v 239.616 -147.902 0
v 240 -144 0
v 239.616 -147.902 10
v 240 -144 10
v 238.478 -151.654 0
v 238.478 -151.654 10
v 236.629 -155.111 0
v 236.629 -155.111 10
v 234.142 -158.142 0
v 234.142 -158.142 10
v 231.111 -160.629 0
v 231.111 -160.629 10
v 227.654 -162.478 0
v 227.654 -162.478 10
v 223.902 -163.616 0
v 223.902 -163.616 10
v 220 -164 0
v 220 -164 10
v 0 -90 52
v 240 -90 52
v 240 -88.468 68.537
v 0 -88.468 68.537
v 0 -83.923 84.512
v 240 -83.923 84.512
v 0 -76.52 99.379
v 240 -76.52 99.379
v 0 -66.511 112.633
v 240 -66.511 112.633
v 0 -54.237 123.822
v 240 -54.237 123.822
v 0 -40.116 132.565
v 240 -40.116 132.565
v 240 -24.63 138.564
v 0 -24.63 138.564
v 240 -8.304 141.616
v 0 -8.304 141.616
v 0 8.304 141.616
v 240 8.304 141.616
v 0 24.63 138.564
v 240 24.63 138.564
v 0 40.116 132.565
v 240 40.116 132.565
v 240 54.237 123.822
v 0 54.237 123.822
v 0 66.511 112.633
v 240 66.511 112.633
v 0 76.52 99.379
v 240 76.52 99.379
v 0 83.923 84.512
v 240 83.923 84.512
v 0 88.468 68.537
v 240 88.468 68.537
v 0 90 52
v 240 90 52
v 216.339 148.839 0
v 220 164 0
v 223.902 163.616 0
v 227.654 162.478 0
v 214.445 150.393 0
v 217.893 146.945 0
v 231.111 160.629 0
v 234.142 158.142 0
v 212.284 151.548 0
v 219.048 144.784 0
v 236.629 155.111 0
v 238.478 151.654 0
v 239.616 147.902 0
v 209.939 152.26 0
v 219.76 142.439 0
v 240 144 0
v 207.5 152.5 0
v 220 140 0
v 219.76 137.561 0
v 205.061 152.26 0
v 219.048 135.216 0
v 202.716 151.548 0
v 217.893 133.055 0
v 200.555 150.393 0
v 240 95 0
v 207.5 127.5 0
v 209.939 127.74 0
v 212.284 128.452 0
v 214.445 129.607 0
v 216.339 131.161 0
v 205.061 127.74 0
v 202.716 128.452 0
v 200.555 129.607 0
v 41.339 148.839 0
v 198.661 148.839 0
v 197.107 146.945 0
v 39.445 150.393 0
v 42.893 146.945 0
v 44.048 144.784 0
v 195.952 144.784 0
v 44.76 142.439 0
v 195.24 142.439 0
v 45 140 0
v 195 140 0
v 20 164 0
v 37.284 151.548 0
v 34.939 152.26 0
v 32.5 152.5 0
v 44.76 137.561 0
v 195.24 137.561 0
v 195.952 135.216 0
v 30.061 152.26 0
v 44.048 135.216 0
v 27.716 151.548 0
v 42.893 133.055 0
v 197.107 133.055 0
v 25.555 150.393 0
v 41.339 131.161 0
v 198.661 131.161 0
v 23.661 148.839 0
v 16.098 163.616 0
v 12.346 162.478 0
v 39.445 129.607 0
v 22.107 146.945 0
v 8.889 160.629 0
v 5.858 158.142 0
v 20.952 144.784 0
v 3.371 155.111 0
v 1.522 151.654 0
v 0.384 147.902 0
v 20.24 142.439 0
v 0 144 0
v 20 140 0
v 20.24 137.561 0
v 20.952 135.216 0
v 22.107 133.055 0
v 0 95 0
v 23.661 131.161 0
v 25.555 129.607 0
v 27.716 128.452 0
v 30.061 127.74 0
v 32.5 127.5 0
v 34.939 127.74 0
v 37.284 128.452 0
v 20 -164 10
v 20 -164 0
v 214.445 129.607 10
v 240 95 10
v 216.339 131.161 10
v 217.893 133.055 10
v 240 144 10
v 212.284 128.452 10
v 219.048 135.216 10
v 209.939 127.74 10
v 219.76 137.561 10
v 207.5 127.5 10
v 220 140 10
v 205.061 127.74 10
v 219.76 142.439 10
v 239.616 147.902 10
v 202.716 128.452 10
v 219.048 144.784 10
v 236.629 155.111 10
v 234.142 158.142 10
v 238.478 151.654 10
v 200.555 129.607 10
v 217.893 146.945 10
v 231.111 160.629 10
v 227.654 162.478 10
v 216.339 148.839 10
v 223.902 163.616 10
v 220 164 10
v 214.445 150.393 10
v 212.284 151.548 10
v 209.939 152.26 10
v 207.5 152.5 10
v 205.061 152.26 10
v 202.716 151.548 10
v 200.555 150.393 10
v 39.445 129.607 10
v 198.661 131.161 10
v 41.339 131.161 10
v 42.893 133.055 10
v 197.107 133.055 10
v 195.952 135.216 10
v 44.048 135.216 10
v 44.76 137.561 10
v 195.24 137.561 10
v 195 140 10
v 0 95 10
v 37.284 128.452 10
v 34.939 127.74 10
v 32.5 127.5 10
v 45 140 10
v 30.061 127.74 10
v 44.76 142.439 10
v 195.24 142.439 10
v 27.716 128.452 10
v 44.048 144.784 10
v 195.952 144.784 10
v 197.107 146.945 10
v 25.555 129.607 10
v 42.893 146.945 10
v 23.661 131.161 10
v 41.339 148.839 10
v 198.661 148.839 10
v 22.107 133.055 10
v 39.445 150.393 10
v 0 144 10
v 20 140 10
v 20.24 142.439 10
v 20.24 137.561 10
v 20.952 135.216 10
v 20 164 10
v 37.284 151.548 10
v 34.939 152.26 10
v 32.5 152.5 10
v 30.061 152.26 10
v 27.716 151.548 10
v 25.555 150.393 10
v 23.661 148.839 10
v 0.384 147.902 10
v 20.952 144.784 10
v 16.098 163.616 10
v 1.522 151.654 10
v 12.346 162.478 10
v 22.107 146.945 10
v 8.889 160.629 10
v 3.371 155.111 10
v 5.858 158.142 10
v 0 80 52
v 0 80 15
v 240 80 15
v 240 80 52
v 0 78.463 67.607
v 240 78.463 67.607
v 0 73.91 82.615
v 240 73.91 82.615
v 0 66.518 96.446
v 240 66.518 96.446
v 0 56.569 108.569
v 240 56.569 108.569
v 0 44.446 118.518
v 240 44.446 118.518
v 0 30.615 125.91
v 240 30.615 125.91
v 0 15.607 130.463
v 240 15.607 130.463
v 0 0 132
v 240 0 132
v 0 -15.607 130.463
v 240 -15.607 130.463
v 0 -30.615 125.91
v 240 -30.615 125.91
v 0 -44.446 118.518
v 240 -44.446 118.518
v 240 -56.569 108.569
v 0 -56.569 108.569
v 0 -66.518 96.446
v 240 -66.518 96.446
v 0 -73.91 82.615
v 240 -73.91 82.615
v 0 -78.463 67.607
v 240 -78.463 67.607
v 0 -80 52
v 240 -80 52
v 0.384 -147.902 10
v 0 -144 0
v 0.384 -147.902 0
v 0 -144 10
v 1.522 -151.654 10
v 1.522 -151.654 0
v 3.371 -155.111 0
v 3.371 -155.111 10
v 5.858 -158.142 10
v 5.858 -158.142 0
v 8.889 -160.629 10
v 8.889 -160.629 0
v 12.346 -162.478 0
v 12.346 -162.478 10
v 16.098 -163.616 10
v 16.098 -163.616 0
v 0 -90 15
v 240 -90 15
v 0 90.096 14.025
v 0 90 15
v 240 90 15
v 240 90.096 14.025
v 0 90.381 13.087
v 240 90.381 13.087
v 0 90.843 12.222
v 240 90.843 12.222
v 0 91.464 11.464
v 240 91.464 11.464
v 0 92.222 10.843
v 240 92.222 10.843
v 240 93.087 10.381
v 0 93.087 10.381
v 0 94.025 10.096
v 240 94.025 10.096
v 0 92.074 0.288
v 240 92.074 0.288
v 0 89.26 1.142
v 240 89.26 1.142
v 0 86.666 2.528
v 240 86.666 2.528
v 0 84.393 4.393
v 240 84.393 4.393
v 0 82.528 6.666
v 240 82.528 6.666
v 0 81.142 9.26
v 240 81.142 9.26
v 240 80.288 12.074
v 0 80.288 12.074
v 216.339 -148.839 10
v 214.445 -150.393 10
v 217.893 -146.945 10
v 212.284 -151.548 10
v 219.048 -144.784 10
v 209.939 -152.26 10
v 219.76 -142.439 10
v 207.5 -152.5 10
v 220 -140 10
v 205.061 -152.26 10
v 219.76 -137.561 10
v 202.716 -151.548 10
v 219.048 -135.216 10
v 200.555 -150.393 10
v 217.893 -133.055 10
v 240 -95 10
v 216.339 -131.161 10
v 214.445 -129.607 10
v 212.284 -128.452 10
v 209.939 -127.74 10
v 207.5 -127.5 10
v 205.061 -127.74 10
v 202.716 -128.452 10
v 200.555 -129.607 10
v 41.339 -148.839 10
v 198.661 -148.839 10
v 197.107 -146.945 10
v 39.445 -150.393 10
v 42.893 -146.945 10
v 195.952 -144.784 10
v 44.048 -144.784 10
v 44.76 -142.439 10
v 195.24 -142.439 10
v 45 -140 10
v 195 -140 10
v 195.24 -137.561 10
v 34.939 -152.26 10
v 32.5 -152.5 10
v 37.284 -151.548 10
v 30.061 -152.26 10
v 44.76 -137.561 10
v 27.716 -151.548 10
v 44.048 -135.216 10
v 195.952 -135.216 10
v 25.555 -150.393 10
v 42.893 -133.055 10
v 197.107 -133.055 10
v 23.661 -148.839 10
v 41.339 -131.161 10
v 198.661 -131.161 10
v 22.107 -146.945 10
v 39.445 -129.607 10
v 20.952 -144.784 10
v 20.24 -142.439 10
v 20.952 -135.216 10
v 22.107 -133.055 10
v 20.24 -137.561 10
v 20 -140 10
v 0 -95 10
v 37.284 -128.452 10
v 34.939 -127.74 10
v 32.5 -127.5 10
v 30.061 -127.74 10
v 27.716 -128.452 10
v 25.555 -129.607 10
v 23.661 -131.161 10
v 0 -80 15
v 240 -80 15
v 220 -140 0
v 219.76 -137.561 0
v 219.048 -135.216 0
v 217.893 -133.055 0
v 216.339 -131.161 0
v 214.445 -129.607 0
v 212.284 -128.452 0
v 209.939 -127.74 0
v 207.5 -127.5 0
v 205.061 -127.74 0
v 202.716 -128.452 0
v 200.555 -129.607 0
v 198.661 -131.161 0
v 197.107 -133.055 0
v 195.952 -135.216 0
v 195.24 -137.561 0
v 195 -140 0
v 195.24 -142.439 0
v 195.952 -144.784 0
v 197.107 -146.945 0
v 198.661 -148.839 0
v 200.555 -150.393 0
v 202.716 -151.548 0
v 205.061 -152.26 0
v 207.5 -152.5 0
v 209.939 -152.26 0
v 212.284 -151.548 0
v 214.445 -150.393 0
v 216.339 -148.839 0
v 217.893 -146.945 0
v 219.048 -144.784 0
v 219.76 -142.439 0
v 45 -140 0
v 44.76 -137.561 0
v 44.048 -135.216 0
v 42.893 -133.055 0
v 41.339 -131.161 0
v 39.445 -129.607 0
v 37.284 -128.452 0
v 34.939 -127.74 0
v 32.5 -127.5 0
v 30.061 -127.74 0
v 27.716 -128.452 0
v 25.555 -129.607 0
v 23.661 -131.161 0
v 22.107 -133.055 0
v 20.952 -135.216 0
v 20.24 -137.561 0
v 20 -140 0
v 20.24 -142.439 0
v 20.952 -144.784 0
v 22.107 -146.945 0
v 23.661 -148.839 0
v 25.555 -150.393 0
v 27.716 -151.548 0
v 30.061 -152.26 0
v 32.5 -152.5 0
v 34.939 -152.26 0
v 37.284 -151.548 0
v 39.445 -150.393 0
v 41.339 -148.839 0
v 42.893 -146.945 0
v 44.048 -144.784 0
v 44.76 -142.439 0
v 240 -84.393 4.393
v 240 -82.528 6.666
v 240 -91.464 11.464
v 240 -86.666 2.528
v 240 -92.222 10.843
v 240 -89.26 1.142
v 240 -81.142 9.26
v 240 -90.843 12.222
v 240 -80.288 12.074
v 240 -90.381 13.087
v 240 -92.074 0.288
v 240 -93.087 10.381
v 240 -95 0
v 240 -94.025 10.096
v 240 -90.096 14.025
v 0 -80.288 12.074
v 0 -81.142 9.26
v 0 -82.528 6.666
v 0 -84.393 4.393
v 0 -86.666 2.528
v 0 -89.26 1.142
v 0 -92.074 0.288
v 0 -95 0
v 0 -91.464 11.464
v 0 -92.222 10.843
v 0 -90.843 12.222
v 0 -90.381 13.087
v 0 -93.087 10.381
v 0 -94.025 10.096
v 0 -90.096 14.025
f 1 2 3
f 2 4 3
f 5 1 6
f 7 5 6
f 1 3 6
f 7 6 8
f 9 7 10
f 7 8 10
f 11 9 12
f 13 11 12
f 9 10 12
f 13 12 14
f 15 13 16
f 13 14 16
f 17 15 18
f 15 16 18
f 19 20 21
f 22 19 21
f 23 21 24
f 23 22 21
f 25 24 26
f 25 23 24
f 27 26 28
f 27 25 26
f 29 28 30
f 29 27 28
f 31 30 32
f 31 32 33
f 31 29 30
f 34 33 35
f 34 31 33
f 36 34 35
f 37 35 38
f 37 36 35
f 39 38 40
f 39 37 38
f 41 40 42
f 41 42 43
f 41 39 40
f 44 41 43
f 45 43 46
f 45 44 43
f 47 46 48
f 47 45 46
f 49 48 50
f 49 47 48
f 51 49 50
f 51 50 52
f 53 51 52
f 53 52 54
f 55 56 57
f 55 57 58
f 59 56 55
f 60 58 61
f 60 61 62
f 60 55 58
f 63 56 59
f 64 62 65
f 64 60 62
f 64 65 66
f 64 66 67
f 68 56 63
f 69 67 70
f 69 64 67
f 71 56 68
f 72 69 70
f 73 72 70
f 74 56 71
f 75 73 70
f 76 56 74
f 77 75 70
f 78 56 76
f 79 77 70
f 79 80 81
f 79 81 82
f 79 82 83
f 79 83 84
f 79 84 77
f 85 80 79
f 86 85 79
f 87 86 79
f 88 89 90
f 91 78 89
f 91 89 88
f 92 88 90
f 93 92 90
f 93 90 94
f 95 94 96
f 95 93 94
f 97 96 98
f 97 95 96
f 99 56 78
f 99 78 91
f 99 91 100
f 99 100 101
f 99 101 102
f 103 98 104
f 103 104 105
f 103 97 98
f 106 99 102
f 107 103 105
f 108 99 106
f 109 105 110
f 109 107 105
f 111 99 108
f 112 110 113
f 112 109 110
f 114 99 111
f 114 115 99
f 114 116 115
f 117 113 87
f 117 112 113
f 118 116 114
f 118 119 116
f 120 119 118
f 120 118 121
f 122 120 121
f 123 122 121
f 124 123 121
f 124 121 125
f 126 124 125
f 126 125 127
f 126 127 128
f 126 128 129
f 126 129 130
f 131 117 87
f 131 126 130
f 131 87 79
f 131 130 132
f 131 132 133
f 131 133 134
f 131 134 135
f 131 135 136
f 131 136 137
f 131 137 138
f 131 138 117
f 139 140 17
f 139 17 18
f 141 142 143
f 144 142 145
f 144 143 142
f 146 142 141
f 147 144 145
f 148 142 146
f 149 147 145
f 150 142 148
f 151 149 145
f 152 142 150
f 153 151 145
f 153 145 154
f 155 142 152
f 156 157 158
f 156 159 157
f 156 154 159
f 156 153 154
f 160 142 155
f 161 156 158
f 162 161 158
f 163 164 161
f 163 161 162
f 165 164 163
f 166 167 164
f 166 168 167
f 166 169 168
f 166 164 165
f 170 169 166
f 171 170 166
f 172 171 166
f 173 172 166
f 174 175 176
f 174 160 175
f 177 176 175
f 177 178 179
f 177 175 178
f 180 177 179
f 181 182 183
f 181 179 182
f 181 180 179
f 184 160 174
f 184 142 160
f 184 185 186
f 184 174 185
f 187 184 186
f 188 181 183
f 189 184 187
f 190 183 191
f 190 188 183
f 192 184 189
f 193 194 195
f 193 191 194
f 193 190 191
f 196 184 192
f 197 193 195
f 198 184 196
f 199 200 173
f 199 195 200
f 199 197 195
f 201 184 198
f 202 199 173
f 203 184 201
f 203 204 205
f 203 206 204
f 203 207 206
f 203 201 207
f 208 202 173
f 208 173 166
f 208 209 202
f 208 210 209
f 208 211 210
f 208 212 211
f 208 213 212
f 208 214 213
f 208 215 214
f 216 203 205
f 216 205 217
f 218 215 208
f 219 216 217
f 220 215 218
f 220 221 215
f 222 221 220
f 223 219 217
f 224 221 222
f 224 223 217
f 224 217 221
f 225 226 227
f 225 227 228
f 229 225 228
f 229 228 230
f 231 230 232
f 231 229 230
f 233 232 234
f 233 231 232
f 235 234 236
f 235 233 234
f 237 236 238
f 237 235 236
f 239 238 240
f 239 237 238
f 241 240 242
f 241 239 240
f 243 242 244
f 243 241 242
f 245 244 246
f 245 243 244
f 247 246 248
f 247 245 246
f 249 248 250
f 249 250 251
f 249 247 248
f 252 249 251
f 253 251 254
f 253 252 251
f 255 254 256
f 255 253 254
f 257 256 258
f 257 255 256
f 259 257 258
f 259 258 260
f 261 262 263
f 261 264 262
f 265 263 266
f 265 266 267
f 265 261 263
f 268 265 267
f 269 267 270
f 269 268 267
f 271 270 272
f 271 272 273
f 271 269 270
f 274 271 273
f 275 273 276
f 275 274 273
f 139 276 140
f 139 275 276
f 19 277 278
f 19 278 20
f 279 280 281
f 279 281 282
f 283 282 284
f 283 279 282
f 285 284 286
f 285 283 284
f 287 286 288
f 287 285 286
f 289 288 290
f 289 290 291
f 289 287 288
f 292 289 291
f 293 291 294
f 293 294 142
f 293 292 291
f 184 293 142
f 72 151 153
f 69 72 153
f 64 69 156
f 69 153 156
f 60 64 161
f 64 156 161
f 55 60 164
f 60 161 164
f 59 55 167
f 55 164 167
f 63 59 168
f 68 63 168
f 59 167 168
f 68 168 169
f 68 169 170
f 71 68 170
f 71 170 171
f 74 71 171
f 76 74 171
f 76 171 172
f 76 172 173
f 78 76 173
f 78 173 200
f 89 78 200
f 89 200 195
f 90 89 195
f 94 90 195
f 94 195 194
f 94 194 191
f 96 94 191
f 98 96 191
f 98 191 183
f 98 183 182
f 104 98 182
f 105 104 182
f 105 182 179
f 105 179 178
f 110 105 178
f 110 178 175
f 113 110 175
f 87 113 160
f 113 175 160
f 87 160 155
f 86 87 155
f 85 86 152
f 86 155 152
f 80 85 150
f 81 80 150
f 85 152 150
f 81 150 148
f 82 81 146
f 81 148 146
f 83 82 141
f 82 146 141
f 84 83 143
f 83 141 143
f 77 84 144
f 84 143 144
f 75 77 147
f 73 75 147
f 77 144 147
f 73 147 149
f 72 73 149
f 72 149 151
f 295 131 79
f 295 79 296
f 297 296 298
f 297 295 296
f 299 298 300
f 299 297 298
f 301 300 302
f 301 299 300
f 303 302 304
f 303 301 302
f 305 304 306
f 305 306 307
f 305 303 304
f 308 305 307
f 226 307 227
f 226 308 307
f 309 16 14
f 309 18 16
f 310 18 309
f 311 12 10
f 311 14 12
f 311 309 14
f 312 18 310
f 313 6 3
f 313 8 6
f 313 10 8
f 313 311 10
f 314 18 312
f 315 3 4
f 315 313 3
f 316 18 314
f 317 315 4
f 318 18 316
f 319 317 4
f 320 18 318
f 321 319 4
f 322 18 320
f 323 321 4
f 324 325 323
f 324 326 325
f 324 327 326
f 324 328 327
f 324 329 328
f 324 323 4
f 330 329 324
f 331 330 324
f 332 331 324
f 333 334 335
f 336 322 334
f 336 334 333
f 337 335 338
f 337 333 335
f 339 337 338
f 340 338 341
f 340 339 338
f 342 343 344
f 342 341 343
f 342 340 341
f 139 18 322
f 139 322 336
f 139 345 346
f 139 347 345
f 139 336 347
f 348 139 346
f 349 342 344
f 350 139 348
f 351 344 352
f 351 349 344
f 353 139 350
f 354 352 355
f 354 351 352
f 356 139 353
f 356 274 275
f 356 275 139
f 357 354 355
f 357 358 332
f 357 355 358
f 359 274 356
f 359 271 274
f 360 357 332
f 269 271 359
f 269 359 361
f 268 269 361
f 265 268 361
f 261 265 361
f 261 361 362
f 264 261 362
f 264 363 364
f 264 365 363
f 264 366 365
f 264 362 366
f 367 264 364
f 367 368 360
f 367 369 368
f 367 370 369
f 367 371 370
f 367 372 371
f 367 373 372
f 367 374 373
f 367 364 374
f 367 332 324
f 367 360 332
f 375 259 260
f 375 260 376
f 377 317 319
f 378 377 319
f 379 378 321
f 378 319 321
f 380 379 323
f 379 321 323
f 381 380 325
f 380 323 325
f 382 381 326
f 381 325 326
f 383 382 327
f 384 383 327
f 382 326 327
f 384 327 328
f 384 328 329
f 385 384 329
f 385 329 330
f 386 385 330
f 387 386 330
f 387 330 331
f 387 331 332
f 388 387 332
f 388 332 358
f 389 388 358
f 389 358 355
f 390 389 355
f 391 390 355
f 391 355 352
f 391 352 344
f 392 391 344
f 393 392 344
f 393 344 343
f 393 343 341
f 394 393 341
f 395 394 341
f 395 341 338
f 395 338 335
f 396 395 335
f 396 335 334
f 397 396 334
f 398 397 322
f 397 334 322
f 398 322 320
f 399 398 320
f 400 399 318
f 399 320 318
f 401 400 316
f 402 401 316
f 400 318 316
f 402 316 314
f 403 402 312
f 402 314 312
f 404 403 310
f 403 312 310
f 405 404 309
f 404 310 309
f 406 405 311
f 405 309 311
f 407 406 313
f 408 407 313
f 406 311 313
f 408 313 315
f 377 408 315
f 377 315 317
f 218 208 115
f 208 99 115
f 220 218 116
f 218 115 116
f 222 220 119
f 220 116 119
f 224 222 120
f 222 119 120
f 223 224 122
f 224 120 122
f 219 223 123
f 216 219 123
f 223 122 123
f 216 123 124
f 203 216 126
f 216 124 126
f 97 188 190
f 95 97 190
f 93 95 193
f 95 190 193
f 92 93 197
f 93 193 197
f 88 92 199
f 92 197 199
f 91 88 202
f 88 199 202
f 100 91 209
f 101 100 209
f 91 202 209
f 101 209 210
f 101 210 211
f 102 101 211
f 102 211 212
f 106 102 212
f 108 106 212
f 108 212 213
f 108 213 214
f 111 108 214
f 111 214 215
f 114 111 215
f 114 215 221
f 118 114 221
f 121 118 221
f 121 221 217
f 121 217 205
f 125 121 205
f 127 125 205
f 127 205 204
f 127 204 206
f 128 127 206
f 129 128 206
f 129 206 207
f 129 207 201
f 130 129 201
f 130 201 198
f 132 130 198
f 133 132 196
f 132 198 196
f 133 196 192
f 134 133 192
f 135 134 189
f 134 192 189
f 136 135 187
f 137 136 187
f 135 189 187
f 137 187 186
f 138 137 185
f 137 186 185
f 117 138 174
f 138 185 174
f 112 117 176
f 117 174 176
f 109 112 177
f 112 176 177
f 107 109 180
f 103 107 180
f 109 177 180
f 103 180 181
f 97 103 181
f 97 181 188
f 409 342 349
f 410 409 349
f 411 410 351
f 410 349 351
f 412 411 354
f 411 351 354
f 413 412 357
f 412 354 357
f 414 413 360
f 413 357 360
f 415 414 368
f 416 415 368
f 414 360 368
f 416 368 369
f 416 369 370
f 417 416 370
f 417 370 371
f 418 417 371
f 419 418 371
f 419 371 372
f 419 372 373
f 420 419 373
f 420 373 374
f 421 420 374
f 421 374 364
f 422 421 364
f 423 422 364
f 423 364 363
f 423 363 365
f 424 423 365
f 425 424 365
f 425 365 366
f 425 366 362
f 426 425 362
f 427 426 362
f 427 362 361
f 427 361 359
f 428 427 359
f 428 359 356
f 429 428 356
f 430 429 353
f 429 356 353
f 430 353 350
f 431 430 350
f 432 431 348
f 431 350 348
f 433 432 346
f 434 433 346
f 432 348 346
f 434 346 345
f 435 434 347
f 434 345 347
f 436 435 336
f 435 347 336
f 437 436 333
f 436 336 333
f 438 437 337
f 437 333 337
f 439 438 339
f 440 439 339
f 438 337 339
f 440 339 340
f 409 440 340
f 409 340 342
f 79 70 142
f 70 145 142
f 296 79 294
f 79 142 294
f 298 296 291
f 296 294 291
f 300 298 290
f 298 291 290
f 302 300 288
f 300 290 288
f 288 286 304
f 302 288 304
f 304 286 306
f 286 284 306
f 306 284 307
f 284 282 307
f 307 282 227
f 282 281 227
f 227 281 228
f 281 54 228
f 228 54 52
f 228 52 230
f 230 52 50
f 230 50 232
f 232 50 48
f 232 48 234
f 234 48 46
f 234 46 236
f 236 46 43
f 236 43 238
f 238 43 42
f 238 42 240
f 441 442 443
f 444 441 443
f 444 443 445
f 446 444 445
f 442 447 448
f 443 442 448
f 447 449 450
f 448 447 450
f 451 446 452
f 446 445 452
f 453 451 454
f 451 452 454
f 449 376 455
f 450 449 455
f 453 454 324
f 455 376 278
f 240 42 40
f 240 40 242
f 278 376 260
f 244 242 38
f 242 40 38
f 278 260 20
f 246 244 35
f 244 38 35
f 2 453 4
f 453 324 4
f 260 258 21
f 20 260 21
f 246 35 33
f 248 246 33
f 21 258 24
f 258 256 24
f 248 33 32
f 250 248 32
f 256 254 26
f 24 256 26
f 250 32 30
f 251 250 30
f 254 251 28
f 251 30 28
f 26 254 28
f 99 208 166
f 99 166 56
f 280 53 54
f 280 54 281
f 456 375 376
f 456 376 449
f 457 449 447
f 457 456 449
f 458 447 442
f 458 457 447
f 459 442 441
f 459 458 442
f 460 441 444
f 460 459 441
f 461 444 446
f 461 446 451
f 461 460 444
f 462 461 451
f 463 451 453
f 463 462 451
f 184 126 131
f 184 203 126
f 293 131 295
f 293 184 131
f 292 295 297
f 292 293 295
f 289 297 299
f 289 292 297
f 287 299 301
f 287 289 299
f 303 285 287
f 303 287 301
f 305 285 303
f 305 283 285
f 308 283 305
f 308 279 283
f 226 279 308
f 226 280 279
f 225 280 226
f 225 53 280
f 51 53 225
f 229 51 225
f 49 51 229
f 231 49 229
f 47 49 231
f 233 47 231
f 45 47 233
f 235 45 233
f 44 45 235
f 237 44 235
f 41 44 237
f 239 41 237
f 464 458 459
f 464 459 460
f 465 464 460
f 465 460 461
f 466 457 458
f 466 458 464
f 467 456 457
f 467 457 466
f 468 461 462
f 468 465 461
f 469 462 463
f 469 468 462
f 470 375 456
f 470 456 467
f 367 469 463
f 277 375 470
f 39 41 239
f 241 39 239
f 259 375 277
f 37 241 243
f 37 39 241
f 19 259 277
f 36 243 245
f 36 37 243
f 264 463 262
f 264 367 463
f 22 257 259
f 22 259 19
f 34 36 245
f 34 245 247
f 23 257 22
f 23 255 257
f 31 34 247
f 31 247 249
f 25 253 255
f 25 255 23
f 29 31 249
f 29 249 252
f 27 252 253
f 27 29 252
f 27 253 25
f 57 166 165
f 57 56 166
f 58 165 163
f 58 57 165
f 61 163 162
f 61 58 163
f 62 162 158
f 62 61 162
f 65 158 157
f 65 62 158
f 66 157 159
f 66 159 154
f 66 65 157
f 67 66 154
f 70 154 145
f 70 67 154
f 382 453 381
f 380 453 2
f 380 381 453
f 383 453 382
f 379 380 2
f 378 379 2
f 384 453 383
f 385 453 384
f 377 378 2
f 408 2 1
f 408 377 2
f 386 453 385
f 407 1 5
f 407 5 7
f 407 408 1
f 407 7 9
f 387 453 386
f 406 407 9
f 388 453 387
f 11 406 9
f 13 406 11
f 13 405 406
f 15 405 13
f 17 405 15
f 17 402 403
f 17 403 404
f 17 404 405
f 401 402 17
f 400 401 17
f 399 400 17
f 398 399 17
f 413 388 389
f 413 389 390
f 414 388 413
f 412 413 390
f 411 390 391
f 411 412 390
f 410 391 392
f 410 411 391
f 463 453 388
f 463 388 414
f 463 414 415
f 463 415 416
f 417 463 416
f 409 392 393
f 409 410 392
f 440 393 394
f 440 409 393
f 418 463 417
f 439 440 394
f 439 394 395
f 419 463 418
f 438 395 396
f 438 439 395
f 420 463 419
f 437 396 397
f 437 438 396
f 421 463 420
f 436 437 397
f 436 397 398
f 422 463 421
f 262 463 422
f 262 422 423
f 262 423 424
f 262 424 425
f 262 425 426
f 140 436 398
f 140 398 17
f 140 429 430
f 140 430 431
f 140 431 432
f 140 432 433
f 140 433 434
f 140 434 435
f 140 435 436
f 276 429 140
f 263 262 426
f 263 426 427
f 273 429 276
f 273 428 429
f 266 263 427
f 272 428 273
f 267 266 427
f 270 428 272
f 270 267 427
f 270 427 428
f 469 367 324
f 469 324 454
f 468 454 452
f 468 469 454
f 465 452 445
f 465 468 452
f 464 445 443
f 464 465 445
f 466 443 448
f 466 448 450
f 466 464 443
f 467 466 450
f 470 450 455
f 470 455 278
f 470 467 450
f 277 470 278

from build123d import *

# Parameters (mm, degrees)
BOSS_EXTRUDE1_DEPTH     = 240
SKETCH2_R               = 12.5
CUT_EXTRUDE1_DEPTH      = 133
CUT_EXTRUDE1_DEPTH_BACK = 11
FILLET1_R               = 20


with BuildPart() as part:
    # Sketch1 → Boss-Extrude1 (new body)
    with BuildSketch(Plane.YZ):
        with BuildLine():
            Line((164, 0), (95, 0))
            ThreePointArc((95, 0), (84.393398282, 4.393398282), (80, 15))
            Line((80, 15), (80, 52))
            ThreePointArc((80, 52), (0, 132), (-80, 52))
            Line((-80, 52), (-80, 15))
            ThreePointArc((-80, 15), (-84.393398282, 4.393398282), (-95, 0))
            Line((-95, 0), (-164, 0))
            Line((-164, 0), (-164, 10))
            Line((-164, 10), (-95, 10))
            ThreePointArc((-95, 10), (-91.464466094, 11.464466094), (-90, 15))
            Line((-90, 15), (-90, 52))
            ThreePointArc((-90, 52), (0, 142), (90, 52))
            Line((90, 52), (90, 15))
            ThreePointArc((90, 15), (91.464466094, 11.464466094), (95, 10))
            Line((95, 10), (164, 10))
            Line((164, 10), (164, 0))
        make_face()
    extrude(amount=BOSS_EXTRUDE1_DEPTH)

    # Sketch2 → Cut-Extrude1 (cut, two sides)
    with BuildSketch(Plane.XY.offset(10)) as cut_extrude1_sk:
        with Locations((32.5, 140)):
            Circle(SKETCH2_R)
        with Locations((207.5, 140)):
            Circle(SKETCH2_R)
        with Locations((207.5, -140)):
            Circle(SKETCH2_R)
        with Locations((32.5, -140)):
            Circle(SKETCH2_R)
    extrude(amount=CUT_EXTRUDE1_DEPTH, mode=Mode.SUBTRACT)
    extrude(cut_extrude1_sk.sketch, amount=-CUT_EXTRUDE1_DEPTH_BACK, mode=Mode.SUBTRACT)

    # Fillet1
    fillet1_edges = [part.edges().sort_by_distance(p)[0] for p in [
        (0, -164, 5),
        (0, 164, 5),
        (240, -164, 5),
        (240, 164, 5),
    ]]
    fillet(fillet1_edges, radius=FILLET1_R)


solid = part.part
